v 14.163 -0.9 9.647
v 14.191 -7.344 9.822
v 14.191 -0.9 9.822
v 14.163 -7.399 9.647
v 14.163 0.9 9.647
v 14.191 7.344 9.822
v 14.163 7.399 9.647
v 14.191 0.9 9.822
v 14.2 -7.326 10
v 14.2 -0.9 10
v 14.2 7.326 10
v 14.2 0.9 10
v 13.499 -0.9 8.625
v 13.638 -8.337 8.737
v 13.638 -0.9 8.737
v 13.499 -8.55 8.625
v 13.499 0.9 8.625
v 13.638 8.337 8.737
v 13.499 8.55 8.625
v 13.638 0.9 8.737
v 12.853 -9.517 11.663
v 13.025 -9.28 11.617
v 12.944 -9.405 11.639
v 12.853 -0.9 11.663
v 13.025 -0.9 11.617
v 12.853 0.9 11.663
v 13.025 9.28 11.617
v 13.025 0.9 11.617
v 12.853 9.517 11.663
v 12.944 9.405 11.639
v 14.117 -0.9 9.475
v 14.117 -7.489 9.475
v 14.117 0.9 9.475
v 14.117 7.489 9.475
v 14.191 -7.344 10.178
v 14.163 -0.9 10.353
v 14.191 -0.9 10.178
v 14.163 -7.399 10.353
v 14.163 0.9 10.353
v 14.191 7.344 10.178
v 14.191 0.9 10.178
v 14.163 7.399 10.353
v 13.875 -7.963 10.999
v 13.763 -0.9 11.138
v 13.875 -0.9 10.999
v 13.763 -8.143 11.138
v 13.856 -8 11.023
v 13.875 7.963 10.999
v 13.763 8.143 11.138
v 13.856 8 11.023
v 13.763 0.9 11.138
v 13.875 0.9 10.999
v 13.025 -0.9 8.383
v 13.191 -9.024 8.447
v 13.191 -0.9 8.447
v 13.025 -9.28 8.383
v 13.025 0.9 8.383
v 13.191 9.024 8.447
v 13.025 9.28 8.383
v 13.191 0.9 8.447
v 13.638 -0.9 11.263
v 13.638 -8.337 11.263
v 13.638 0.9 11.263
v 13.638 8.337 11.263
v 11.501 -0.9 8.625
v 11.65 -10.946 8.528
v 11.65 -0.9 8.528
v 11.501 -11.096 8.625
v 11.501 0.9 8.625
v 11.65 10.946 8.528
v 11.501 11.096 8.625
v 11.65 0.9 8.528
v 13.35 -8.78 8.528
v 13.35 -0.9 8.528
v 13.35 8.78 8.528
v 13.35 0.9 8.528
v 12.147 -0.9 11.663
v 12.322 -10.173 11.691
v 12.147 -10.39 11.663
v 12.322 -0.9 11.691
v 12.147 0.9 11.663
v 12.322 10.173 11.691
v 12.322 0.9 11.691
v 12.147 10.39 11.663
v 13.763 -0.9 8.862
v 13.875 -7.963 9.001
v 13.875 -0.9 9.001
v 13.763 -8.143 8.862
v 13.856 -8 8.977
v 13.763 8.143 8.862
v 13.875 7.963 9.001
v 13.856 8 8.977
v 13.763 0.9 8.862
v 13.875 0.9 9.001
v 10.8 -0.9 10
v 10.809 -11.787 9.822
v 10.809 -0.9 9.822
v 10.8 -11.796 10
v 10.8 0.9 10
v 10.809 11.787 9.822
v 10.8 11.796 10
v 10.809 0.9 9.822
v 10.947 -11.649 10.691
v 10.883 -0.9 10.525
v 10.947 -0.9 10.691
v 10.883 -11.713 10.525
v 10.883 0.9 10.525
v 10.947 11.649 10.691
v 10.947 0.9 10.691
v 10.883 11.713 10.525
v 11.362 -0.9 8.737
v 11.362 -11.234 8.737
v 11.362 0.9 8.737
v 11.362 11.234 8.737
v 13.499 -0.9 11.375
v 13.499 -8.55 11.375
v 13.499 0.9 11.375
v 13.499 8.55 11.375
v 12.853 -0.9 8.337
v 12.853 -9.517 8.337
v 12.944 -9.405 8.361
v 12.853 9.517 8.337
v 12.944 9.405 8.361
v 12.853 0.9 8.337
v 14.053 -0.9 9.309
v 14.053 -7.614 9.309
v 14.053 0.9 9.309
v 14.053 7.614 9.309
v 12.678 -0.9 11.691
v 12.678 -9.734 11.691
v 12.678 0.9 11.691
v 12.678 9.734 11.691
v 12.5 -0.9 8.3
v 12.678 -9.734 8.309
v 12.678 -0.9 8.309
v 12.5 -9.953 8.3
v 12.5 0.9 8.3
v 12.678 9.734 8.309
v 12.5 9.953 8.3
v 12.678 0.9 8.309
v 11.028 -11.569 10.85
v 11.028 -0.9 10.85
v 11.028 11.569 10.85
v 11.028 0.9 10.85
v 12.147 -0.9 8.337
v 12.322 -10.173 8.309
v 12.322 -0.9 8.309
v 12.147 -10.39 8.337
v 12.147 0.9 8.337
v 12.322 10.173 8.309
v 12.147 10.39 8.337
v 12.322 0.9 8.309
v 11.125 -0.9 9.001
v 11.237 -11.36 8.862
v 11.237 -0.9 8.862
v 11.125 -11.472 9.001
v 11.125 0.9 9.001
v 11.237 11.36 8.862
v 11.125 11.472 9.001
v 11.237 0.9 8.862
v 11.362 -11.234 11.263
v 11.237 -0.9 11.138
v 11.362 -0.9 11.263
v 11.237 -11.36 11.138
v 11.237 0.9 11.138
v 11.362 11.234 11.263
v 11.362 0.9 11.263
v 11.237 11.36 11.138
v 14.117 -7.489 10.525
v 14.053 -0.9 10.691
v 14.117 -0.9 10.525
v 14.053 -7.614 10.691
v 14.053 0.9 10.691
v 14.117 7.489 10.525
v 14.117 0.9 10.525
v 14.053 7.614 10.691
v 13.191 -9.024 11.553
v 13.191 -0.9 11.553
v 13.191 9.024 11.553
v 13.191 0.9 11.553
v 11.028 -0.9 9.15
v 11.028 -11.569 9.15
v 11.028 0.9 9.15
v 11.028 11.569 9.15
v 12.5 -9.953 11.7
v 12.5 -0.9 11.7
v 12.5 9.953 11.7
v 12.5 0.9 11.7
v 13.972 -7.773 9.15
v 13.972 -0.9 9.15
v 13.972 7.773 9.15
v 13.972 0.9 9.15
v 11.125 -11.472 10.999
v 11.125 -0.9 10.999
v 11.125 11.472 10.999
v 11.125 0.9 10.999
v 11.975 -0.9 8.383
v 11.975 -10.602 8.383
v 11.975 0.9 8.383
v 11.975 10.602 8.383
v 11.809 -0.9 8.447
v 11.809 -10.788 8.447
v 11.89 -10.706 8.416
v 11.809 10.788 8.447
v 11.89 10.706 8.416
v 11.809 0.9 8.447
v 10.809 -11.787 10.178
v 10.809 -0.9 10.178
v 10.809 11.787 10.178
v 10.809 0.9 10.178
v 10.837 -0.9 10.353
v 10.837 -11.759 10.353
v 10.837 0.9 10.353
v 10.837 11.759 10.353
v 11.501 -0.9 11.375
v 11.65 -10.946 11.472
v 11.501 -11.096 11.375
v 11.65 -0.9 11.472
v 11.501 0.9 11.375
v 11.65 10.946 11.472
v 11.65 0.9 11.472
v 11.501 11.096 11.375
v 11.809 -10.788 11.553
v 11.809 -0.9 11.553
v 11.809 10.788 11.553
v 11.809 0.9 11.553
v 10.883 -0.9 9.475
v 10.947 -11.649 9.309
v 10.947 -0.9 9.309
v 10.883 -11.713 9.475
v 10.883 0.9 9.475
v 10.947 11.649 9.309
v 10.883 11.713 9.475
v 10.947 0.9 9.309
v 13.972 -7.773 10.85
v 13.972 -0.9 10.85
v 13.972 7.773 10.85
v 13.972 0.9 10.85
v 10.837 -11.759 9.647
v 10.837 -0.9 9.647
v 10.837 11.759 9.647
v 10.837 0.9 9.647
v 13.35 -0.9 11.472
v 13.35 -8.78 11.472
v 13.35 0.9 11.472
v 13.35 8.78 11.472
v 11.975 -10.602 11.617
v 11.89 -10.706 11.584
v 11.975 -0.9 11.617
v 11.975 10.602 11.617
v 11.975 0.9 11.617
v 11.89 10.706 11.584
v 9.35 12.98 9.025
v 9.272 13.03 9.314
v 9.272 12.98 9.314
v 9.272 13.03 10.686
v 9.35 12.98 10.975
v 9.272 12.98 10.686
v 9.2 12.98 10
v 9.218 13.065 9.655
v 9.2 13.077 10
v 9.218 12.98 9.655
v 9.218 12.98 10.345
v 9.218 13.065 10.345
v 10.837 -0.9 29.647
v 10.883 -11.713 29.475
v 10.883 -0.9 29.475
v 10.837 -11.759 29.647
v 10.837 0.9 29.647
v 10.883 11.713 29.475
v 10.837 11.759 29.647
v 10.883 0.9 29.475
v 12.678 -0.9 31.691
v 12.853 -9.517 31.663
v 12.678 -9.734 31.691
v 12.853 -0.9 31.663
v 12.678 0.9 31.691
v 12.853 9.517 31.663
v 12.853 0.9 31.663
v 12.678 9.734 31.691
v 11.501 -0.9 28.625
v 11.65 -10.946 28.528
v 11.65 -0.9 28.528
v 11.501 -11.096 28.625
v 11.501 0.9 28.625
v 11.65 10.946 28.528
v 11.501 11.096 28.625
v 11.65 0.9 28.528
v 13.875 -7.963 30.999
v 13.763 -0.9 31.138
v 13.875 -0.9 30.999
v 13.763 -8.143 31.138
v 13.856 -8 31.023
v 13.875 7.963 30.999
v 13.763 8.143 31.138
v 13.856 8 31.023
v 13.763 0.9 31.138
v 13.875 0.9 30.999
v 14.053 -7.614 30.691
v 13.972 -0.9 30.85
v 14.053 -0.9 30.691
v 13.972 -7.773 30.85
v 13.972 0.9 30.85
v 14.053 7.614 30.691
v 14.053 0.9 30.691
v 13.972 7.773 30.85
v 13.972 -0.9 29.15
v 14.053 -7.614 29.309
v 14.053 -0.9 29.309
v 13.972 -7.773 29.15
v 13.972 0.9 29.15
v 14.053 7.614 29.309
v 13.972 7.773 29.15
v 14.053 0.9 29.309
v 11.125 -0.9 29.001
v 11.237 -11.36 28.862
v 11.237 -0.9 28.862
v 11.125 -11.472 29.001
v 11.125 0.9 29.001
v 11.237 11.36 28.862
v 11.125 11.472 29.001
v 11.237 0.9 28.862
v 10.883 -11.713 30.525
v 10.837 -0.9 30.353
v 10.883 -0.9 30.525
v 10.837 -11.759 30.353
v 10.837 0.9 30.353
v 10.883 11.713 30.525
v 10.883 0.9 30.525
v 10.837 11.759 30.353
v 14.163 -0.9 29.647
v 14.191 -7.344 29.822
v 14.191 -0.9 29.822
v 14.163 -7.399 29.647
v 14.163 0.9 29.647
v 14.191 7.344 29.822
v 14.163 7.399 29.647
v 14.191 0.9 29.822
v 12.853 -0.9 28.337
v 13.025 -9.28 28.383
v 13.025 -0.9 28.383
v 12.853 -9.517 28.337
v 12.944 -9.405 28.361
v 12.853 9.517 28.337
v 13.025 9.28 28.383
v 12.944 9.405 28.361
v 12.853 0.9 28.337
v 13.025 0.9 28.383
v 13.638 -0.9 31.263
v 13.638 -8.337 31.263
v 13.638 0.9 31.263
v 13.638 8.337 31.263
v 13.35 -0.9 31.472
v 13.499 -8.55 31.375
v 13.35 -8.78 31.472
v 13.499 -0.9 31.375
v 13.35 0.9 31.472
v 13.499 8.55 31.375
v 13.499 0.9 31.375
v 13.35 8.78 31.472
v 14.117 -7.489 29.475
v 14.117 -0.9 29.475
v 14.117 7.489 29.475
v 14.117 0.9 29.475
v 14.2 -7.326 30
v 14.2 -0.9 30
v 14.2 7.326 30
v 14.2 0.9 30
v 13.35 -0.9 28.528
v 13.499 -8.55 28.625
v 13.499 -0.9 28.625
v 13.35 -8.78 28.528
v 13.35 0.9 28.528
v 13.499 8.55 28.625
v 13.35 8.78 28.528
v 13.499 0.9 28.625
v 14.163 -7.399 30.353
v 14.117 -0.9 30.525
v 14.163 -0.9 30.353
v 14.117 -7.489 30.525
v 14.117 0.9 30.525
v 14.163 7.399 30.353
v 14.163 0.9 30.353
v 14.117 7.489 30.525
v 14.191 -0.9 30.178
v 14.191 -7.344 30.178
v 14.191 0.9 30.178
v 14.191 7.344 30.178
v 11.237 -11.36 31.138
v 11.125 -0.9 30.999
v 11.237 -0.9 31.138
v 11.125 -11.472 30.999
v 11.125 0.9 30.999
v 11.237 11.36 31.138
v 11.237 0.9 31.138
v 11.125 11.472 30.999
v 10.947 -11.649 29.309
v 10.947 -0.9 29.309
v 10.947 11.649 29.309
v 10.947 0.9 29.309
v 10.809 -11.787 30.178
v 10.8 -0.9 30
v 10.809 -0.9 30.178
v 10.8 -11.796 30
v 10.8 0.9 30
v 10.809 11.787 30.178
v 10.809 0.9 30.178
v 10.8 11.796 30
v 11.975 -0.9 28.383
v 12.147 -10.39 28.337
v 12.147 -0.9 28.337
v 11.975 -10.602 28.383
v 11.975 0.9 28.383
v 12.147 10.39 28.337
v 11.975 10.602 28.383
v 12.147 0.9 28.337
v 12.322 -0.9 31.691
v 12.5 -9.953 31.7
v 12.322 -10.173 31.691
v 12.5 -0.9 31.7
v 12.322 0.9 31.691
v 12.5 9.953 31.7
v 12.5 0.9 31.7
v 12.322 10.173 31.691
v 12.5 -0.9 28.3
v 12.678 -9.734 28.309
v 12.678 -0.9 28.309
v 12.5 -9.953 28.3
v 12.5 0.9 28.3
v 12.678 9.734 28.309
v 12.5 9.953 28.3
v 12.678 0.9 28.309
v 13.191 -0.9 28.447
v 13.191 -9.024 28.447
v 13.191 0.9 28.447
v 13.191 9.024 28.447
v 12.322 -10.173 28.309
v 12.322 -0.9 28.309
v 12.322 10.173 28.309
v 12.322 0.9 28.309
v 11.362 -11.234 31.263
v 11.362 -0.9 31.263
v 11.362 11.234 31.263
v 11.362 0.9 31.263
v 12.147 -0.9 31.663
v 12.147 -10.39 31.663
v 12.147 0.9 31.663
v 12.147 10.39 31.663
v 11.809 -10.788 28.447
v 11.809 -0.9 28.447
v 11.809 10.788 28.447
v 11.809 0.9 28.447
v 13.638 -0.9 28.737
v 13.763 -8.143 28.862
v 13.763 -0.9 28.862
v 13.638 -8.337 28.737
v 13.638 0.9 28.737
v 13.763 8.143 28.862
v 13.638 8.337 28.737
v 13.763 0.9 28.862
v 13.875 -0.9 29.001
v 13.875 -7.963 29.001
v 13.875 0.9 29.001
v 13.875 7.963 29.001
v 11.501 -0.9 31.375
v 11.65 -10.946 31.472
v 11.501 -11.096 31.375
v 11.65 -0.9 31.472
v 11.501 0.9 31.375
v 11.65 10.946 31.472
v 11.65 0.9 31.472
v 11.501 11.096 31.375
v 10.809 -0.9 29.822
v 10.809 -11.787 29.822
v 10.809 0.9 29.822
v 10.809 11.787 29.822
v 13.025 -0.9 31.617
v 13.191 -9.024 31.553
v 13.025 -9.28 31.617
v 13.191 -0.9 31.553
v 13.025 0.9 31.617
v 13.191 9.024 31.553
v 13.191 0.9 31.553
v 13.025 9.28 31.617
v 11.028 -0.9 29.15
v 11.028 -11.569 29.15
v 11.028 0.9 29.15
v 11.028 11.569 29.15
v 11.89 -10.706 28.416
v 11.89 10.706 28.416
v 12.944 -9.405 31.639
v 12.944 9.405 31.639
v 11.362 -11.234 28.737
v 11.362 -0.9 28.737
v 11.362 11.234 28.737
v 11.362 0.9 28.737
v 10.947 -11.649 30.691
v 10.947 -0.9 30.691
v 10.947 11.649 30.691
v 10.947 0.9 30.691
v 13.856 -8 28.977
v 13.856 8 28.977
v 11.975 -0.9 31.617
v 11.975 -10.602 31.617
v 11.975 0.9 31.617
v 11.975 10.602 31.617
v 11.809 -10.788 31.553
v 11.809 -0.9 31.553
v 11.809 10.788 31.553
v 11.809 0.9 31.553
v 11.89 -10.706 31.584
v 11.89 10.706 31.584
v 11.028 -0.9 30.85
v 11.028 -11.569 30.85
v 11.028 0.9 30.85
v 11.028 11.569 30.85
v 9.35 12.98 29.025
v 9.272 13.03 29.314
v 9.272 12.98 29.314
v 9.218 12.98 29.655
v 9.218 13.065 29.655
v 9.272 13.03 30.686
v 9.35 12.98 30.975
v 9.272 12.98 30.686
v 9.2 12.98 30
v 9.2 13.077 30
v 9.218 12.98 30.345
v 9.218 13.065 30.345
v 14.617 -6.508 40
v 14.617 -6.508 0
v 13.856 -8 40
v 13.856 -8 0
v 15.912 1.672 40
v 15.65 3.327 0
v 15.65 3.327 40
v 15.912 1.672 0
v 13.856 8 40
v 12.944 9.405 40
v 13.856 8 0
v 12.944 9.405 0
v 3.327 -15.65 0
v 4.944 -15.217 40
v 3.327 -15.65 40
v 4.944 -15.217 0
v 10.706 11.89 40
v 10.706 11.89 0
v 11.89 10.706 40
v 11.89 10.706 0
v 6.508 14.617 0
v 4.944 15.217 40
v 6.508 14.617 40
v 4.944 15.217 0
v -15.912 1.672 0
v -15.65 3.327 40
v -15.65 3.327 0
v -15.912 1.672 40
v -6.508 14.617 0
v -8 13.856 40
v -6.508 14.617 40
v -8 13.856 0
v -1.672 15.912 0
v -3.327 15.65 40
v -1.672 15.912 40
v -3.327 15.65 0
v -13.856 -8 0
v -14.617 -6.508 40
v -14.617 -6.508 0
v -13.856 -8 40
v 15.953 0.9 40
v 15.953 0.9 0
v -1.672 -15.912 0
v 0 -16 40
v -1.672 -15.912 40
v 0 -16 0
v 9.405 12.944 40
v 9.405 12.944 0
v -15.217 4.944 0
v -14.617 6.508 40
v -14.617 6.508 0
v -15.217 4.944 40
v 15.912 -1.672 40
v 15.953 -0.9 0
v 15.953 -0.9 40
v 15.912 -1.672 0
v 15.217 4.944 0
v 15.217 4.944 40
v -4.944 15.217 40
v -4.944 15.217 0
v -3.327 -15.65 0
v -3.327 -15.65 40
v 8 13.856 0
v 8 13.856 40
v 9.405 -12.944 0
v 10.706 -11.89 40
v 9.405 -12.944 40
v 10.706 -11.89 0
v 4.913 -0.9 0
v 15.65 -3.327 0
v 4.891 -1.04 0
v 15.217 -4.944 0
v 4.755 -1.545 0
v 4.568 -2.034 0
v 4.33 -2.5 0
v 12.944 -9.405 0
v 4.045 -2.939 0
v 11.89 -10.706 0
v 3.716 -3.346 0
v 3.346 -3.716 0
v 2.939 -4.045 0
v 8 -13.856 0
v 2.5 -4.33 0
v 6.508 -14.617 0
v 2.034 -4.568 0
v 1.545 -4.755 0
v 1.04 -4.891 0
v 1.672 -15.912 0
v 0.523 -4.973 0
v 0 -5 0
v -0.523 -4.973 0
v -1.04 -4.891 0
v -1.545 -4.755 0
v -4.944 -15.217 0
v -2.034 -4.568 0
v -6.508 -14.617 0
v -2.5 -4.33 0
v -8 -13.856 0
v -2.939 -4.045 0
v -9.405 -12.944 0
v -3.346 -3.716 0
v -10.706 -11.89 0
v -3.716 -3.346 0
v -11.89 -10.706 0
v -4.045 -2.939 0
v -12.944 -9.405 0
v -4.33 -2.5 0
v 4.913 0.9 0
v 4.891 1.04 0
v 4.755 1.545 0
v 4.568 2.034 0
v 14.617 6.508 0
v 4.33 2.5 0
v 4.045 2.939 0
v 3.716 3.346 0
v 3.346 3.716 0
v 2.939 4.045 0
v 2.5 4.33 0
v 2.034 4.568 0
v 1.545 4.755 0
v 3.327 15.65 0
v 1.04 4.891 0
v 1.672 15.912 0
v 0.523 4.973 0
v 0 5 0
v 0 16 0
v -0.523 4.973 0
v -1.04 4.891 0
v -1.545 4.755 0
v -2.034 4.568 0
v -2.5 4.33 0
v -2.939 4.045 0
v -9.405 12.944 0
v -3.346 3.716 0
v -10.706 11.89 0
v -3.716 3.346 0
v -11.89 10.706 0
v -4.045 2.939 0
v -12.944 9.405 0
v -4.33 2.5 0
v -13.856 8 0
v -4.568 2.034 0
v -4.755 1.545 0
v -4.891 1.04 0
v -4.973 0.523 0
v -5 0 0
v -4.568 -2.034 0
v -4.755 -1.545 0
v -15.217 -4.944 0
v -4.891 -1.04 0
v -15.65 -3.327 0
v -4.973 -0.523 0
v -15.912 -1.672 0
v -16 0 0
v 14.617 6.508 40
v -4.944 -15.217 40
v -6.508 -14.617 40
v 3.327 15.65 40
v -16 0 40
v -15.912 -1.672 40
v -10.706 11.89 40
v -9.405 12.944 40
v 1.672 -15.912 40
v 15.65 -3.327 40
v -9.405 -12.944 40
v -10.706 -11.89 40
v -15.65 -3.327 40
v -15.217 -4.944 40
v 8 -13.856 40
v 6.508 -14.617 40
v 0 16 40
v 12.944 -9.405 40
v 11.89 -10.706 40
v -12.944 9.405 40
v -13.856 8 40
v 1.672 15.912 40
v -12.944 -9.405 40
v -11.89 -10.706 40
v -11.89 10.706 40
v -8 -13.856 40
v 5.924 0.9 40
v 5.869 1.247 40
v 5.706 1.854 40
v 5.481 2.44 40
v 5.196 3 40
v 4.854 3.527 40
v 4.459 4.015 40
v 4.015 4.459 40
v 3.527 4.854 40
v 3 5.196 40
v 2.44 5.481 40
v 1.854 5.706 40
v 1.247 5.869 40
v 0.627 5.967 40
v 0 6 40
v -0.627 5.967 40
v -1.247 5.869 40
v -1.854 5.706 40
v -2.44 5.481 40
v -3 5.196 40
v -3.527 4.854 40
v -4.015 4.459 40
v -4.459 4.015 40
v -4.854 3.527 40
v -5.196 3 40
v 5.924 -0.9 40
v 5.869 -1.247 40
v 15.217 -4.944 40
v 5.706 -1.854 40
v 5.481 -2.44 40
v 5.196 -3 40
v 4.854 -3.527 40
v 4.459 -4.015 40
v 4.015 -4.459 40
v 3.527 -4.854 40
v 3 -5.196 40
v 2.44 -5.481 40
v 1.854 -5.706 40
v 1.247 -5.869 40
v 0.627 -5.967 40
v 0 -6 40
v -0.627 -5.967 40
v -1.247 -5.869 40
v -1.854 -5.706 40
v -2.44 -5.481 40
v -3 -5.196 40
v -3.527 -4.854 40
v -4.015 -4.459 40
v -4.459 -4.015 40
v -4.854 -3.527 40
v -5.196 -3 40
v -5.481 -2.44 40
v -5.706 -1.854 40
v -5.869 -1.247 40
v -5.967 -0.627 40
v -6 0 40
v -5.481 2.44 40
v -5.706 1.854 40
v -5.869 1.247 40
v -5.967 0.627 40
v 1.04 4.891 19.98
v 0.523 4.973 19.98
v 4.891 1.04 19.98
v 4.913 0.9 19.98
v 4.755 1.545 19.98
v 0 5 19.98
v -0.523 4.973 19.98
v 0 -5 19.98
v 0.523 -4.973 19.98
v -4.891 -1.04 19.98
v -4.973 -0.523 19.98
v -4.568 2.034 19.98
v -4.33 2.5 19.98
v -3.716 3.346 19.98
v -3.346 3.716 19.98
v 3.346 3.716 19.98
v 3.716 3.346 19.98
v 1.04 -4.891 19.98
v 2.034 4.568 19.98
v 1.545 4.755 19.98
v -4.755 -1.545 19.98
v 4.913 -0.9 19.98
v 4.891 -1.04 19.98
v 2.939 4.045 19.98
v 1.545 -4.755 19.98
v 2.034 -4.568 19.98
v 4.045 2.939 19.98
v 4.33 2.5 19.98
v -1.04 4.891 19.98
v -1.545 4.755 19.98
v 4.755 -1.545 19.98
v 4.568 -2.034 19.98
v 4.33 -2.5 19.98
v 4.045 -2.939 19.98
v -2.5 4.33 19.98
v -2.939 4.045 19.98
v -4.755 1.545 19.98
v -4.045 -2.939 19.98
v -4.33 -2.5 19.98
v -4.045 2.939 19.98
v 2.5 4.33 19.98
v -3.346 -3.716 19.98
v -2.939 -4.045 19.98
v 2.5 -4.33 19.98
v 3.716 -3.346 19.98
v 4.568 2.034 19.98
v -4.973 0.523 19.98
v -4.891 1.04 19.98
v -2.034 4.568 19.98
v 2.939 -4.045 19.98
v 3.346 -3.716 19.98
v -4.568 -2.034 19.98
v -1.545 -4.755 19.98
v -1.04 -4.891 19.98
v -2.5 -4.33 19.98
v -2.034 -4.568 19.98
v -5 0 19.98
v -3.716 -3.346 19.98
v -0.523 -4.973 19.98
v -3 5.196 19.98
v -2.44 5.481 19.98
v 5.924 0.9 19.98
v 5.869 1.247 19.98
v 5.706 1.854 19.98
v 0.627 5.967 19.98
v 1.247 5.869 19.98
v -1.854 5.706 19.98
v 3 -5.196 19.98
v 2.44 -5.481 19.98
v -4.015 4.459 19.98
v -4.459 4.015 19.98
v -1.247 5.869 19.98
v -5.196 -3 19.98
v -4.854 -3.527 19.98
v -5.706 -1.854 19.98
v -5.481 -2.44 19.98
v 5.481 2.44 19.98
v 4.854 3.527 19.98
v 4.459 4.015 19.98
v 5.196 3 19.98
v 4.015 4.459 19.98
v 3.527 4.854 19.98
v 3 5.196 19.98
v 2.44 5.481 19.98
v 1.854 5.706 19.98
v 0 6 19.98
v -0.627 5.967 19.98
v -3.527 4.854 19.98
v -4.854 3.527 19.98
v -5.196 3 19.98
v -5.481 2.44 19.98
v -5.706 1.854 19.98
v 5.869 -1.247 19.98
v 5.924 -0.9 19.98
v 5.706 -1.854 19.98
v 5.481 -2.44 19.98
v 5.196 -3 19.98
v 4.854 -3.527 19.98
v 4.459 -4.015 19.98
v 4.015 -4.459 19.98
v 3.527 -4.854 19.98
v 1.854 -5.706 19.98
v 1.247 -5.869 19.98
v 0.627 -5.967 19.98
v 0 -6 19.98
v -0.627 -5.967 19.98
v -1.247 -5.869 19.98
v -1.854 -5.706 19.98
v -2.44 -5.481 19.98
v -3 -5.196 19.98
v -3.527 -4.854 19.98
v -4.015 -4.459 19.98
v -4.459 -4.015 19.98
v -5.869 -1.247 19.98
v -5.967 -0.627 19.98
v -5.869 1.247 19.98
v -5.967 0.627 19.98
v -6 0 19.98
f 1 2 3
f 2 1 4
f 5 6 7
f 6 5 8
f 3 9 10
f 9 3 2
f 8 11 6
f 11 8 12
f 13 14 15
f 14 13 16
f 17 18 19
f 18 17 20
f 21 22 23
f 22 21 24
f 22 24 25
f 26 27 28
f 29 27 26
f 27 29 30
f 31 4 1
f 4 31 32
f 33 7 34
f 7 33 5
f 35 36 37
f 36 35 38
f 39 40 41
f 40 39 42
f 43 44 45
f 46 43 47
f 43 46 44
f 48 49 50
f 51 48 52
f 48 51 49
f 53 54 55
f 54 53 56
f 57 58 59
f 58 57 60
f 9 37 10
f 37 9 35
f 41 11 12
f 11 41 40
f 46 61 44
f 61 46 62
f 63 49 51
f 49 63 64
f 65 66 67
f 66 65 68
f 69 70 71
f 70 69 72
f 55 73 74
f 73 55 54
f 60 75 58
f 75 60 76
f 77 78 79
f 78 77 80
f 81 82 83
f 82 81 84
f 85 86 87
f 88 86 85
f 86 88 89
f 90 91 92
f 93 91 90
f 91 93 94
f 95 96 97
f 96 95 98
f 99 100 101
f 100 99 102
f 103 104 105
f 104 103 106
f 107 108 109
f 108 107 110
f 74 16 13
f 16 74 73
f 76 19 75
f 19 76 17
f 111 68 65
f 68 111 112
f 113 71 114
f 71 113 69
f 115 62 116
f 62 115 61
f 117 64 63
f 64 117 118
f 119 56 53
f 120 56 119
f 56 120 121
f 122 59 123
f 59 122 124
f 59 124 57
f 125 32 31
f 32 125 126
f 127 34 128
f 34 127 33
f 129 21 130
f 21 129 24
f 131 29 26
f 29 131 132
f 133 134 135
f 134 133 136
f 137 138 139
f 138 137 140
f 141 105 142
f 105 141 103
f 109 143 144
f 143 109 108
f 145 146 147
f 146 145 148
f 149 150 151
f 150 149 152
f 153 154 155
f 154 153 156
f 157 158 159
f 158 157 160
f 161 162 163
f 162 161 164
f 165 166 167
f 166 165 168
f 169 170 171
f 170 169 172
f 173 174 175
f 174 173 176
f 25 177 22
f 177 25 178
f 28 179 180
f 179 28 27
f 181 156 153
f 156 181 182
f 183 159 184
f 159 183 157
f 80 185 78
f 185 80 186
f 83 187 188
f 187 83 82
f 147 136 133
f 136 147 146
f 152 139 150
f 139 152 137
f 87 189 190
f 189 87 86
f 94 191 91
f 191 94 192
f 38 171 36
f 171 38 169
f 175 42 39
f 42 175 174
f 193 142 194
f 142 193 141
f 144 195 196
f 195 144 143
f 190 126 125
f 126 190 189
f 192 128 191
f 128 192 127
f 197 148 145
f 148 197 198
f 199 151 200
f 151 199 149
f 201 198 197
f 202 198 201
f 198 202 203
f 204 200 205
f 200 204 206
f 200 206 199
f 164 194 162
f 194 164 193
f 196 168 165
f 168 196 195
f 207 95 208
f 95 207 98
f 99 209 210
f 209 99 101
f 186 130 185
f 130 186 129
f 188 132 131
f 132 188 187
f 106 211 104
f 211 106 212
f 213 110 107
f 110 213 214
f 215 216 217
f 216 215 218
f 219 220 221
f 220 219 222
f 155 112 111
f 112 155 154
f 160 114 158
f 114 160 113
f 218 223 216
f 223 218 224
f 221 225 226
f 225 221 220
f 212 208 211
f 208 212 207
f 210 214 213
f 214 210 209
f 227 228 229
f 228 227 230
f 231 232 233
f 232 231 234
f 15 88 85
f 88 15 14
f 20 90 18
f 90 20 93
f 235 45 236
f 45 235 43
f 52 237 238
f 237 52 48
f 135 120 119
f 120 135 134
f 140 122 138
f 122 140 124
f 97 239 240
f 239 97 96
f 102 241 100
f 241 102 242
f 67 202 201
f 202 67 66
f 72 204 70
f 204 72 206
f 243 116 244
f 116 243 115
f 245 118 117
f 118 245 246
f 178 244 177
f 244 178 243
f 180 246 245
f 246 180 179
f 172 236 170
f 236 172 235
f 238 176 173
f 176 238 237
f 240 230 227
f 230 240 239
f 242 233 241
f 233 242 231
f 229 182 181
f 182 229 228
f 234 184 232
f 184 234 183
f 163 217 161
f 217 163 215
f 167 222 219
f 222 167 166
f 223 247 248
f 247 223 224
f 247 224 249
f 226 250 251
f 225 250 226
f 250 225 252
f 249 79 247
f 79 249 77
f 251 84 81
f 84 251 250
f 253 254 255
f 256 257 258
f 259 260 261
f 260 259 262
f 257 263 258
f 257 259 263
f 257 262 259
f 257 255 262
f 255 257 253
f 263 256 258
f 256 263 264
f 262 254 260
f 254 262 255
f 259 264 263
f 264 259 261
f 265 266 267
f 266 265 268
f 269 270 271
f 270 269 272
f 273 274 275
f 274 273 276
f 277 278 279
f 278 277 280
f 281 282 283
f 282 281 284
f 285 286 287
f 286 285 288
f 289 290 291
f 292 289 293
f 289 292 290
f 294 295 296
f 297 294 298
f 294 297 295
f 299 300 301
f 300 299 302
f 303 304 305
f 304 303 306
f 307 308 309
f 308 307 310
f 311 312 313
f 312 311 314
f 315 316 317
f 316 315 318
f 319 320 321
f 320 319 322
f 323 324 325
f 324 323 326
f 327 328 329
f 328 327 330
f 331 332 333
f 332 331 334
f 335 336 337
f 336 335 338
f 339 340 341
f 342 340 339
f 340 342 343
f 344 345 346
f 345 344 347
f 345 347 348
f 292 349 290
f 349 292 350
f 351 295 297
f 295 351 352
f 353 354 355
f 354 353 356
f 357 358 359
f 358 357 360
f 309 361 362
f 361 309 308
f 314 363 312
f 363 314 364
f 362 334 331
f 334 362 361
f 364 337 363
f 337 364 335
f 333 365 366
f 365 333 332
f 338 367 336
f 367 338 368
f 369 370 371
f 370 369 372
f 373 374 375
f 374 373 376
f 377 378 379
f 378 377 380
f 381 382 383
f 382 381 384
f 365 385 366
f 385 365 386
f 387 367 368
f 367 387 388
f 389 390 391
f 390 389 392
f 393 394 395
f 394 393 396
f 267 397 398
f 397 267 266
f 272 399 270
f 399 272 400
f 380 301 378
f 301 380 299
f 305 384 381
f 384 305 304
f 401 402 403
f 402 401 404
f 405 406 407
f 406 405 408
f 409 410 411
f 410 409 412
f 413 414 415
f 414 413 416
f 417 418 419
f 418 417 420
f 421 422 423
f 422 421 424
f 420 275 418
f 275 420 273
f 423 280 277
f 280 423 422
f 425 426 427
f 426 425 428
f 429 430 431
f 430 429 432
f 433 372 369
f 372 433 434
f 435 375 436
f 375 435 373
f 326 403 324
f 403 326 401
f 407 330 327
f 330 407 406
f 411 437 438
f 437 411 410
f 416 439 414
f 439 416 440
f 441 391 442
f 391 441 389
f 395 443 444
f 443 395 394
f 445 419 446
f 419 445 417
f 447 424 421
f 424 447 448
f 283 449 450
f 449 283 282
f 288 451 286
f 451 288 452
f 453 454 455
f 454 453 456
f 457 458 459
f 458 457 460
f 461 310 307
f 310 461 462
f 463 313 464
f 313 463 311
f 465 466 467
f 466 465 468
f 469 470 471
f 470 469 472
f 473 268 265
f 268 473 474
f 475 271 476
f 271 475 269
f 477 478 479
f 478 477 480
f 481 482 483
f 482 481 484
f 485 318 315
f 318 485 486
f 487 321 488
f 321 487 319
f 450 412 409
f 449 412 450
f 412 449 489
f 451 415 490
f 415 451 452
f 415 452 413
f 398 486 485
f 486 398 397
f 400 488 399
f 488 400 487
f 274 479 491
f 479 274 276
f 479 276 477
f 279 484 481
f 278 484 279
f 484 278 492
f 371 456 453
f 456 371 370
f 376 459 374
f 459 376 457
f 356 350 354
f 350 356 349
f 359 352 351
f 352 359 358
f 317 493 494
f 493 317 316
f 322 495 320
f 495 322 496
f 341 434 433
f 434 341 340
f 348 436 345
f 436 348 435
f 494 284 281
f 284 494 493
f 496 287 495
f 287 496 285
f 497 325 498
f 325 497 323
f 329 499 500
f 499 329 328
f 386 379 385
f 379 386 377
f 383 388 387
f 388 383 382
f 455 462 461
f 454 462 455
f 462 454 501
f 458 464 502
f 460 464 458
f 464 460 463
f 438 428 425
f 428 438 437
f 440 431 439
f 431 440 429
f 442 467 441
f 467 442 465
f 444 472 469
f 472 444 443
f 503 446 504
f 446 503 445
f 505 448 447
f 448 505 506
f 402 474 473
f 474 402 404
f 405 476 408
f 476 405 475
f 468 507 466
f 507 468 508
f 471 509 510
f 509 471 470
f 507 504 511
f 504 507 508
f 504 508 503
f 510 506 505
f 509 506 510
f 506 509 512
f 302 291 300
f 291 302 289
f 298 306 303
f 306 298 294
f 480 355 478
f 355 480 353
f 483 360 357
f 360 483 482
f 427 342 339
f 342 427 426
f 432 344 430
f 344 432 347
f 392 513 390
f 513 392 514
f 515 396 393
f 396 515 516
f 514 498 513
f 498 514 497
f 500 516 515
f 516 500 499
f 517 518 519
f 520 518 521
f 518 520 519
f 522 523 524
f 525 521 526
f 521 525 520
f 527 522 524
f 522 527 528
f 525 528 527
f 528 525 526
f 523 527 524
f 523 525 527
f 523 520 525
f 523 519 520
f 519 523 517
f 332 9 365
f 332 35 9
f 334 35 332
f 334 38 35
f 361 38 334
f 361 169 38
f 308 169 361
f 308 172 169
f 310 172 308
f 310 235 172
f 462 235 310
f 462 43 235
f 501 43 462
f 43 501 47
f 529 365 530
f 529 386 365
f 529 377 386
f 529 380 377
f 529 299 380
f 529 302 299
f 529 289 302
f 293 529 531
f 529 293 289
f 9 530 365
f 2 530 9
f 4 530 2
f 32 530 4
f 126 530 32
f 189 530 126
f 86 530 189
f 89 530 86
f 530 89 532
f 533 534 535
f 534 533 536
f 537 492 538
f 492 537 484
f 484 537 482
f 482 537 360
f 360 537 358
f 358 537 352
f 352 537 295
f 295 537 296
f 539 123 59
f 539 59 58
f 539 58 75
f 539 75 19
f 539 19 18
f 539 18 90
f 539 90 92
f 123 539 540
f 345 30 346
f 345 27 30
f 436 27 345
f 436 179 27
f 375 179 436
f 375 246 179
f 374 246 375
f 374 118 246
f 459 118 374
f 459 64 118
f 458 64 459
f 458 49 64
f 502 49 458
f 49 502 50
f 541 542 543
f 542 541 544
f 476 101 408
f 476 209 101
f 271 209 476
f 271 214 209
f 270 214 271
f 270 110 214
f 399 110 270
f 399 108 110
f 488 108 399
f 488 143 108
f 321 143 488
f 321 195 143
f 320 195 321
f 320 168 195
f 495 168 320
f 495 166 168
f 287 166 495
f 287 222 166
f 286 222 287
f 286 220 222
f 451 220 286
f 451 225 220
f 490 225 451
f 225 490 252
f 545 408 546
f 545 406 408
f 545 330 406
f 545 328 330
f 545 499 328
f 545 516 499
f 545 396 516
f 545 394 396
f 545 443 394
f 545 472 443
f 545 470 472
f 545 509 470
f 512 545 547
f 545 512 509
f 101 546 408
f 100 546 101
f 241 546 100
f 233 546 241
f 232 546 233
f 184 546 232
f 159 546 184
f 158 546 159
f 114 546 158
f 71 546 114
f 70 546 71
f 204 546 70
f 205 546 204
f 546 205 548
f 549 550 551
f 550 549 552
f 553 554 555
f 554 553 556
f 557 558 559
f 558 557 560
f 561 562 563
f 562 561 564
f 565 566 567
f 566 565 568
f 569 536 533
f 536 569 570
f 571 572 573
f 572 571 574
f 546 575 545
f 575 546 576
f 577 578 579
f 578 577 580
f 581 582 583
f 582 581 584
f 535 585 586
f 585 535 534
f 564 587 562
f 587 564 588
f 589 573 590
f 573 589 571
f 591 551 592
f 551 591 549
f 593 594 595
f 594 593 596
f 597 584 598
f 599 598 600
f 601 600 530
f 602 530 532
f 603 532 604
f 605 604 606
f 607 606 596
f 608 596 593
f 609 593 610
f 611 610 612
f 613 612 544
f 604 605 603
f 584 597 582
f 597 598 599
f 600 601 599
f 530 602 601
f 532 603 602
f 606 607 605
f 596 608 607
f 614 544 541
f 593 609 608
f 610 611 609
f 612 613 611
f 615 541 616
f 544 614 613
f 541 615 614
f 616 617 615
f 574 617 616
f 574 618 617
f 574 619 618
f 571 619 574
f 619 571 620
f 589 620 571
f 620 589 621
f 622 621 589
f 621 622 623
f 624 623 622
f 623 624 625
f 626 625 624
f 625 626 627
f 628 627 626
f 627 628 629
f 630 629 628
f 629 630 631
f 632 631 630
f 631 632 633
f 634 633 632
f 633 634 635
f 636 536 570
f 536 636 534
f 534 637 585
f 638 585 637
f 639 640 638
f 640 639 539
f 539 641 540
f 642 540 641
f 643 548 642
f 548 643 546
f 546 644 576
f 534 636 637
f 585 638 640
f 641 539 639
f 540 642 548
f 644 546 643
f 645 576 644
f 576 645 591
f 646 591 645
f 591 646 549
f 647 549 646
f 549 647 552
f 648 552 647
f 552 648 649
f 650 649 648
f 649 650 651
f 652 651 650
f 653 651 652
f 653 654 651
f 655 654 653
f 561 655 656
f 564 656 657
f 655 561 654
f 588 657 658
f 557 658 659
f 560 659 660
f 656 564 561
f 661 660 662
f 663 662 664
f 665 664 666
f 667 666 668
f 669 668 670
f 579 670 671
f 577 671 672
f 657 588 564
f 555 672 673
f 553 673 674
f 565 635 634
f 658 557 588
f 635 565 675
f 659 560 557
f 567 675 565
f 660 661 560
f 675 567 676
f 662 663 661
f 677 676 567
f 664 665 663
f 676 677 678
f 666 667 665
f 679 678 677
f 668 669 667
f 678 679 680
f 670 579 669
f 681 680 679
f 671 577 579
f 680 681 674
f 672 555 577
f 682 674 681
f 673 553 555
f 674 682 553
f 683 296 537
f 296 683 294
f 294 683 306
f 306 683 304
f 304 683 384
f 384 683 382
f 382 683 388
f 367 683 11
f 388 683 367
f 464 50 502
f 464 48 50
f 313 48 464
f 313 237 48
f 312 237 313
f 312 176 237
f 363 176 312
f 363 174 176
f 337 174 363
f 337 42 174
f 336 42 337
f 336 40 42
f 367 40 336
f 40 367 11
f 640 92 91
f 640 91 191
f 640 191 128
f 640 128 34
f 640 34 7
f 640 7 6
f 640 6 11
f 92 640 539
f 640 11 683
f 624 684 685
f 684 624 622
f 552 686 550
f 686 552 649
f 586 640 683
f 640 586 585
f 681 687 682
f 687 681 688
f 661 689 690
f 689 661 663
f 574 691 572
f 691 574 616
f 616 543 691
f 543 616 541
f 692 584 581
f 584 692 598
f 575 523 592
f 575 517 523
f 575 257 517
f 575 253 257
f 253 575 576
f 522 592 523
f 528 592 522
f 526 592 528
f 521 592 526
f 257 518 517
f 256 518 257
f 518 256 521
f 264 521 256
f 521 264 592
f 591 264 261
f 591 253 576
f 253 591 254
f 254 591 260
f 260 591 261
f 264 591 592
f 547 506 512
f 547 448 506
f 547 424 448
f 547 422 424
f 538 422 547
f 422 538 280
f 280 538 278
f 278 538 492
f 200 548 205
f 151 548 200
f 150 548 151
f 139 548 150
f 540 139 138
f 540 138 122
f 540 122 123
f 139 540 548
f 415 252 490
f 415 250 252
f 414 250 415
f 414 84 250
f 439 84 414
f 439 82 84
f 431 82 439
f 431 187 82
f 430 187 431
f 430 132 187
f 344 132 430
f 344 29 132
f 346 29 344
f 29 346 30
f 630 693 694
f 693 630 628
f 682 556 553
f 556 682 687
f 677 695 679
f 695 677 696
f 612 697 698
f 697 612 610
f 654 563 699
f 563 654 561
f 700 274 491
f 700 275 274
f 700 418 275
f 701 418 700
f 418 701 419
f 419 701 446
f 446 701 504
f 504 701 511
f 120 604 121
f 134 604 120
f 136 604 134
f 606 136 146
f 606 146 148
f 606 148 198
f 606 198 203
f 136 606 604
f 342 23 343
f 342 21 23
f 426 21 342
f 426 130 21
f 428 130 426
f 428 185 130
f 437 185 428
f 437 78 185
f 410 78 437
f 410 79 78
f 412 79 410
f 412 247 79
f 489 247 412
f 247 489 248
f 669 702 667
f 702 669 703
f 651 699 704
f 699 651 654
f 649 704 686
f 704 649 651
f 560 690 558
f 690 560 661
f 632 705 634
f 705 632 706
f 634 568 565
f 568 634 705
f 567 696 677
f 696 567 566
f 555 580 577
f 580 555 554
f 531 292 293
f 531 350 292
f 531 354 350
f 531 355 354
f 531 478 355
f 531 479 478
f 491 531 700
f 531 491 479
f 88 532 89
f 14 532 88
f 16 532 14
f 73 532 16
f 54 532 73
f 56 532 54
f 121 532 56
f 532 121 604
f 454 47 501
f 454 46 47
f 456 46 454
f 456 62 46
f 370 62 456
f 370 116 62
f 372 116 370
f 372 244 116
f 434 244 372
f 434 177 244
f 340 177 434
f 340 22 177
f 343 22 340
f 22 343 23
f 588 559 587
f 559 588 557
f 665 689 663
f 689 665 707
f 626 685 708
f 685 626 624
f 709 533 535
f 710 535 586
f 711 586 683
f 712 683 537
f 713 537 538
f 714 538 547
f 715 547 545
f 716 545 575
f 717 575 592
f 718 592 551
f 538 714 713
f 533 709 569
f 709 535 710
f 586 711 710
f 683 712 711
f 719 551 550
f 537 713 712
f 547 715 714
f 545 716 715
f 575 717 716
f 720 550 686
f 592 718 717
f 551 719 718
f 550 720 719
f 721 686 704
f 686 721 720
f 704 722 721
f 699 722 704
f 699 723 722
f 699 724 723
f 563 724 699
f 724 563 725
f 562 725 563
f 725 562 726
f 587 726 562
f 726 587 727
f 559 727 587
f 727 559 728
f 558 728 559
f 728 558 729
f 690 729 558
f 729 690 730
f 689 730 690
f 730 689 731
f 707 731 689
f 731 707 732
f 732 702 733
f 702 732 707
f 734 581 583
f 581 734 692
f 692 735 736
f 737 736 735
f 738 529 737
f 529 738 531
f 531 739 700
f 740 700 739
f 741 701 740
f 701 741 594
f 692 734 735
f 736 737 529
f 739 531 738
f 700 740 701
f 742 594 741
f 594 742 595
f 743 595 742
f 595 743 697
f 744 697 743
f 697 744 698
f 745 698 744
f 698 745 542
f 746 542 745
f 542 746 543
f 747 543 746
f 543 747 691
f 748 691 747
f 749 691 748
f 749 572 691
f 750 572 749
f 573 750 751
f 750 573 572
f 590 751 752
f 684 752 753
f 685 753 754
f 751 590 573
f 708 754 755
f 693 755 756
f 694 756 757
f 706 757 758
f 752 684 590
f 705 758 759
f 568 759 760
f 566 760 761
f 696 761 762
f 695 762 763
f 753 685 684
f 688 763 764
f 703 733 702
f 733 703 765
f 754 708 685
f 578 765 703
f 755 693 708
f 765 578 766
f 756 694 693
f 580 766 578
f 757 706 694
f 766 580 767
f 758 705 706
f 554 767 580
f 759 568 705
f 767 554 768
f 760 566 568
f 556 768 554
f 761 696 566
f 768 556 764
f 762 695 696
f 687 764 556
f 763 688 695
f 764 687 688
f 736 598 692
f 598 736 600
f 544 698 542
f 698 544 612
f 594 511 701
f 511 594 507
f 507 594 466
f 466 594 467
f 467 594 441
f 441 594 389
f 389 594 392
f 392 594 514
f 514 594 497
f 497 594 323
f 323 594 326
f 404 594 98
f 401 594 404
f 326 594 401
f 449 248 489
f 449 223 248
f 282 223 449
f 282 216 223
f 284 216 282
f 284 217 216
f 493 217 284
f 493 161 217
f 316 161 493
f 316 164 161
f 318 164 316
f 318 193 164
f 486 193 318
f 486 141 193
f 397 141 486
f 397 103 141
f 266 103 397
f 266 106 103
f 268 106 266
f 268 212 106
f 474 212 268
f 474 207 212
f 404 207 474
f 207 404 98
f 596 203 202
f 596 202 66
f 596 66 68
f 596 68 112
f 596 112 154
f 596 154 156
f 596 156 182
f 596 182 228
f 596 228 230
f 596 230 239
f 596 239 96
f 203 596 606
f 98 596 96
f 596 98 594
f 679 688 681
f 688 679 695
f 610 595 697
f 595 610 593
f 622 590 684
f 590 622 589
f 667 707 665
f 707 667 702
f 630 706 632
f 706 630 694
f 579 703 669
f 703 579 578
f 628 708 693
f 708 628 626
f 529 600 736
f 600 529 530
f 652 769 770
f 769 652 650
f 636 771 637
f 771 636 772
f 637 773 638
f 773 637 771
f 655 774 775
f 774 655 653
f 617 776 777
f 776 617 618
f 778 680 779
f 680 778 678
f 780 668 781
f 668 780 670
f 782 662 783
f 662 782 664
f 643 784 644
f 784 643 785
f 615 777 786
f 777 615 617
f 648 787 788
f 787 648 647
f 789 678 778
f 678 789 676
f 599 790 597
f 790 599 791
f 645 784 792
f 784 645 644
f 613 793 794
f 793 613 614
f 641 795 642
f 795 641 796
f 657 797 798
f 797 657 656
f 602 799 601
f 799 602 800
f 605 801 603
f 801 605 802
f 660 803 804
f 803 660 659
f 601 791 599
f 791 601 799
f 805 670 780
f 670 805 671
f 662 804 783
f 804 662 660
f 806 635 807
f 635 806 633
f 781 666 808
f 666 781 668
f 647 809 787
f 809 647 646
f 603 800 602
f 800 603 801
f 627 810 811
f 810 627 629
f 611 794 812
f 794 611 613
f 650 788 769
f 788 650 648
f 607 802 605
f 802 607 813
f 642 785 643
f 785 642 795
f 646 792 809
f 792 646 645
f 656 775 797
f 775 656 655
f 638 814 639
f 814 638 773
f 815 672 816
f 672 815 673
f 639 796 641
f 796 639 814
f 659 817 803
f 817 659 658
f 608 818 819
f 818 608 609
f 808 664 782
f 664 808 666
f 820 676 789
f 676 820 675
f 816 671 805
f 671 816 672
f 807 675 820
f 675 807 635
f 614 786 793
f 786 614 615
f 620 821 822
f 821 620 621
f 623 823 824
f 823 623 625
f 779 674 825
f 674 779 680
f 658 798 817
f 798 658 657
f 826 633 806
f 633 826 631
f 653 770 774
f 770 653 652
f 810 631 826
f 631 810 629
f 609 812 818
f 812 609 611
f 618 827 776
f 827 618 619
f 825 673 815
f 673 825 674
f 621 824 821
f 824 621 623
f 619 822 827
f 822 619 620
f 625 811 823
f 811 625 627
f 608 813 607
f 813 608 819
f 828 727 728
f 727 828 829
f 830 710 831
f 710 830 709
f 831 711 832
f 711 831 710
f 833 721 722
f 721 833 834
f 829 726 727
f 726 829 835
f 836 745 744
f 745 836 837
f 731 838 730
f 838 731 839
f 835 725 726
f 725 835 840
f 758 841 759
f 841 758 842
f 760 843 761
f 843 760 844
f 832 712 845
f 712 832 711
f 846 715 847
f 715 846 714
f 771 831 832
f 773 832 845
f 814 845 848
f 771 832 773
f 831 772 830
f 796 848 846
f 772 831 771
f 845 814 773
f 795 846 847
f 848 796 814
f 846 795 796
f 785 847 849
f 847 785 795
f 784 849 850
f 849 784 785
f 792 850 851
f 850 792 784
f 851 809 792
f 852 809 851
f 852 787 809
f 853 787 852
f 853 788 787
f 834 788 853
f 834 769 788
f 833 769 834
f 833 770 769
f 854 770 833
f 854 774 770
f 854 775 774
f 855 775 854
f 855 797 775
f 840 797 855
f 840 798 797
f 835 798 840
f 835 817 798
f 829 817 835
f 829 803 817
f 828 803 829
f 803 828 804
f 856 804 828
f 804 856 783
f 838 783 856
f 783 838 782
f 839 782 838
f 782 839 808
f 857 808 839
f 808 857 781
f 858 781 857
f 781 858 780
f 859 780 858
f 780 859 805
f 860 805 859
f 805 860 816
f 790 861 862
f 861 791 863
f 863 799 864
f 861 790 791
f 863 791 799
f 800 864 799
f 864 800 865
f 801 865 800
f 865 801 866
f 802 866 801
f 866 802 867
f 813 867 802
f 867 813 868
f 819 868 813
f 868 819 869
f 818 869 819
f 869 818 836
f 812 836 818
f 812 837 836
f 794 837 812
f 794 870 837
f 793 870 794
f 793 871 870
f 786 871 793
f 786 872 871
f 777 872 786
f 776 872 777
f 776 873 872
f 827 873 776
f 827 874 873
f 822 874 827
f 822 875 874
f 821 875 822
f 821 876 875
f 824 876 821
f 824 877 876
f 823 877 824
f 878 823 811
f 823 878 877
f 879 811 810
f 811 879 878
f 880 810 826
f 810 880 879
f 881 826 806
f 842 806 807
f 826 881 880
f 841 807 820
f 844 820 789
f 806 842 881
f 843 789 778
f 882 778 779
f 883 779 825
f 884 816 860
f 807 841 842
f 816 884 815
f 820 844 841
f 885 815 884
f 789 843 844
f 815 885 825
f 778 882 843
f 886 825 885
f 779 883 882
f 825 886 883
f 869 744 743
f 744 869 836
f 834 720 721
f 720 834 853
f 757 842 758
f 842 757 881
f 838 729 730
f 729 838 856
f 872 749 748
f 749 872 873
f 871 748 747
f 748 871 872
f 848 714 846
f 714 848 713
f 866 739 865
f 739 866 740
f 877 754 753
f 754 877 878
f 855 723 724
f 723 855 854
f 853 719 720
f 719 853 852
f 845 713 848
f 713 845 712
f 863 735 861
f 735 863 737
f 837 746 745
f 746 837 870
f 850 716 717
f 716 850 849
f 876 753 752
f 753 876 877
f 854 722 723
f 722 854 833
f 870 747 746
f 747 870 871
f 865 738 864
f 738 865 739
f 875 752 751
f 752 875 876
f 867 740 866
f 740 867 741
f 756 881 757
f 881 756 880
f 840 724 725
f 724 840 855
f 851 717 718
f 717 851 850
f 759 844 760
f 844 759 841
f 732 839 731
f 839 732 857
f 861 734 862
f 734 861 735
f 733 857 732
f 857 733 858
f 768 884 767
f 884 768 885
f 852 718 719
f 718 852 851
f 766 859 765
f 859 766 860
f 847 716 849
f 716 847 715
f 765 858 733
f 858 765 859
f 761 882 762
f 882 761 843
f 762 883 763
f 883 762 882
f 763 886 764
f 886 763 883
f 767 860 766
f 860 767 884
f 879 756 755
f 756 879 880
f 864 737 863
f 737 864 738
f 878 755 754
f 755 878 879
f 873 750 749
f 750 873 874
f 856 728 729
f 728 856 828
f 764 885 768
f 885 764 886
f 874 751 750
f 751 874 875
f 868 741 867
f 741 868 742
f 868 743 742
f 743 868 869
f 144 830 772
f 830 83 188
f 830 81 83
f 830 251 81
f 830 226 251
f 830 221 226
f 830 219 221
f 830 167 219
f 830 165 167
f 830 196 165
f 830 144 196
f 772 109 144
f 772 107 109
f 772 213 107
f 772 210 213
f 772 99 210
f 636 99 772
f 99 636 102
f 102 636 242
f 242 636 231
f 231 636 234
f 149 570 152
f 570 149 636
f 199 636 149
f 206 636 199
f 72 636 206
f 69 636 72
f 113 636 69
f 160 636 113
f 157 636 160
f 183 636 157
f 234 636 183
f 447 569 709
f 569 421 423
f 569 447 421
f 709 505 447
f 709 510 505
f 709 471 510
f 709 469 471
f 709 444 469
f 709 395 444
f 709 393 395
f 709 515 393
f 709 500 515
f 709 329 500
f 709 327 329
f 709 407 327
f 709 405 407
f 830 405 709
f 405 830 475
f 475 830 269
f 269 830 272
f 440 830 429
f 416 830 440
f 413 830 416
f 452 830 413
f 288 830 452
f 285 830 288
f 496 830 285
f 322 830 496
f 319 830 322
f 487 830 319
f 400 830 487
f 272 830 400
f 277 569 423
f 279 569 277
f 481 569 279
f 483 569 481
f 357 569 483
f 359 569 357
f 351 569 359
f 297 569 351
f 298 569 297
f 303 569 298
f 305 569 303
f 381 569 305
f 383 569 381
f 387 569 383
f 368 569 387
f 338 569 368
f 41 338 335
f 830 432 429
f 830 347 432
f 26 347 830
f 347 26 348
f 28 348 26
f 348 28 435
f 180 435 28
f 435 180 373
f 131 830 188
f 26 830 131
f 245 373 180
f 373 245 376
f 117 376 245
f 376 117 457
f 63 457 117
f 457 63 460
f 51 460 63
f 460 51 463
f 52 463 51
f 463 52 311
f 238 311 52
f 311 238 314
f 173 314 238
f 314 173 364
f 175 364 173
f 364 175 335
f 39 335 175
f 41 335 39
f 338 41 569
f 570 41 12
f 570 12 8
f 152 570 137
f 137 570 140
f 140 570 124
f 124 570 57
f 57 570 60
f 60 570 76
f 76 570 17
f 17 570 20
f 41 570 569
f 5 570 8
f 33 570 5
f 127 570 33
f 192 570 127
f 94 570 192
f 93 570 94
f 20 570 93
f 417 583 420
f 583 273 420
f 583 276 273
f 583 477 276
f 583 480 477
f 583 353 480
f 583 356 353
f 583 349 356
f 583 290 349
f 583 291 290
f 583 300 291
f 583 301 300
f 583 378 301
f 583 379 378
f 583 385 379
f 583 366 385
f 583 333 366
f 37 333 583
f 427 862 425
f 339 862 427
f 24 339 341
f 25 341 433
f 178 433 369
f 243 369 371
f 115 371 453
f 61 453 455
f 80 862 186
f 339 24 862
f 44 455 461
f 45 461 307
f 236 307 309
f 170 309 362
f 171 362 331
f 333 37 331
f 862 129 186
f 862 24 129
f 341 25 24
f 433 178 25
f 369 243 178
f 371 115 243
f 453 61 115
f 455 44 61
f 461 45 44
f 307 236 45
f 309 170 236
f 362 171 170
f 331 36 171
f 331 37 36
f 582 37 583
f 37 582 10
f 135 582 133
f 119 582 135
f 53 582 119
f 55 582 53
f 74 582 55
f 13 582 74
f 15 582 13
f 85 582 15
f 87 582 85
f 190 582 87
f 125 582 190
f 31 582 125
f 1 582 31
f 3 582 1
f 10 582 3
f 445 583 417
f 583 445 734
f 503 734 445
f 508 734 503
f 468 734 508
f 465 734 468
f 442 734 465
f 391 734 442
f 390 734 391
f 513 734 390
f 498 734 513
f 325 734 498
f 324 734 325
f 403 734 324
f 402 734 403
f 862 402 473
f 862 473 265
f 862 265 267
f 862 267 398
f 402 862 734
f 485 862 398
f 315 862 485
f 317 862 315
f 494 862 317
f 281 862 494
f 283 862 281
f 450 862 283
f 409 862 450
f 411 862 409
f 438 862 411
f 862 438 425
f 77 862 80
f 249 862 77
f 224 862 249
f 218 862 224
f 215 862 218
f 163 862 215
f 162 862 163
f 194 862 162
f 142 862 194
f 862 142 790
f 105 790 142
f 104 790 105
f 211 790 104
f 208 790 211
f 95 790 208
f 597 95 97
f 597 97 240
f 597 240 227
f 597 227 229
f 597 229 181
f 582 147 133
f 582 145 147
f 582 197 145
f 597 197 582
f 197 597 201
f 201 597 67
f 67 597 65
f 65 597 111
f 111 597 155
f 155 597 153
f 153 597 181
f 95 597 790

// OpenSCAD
// Split shaft coupling 10 mm to 12 mm.
$fn = 60;
eps = 0.02;
shaft_a = 10;
shaft_b = 12;
outer_d = 32;
length = 40;
slit_w = 1.8;
screw_d = 3.4;
module clamp_hole(z) {
    translate([outer_d / 2 - 3.5, -outer_d / 2 - eps, z]) rotate([-90, 0, 0]) cylinder(d = screw_d, h = outer_d + 2 * eps);
    translate([outer_d / 2 - 3.5, outer_d / 2 - 3 - eps, z]) rotate([-90, 0, 0]) cylinder(d = 6.6, h = 3 + 2 * eps);
}
difference() {
    cylinder(d = outer_d, h = length);
    translate([0, 0, -eps]) cylinder(d = shaft_a, h = length / 2 + eps);
    translate([0, 0, length / 2 - eps]) cylinder(d = shaft_b, h = length / 2 + eps);
    translate([0, -slit_w / 2, -eps]) cube([outer_d / 2 + eps, slit_w, length + 2 * eps]);
    clamp_hole(length / 4);
    clamp_hole(3 * length / 4);
}
